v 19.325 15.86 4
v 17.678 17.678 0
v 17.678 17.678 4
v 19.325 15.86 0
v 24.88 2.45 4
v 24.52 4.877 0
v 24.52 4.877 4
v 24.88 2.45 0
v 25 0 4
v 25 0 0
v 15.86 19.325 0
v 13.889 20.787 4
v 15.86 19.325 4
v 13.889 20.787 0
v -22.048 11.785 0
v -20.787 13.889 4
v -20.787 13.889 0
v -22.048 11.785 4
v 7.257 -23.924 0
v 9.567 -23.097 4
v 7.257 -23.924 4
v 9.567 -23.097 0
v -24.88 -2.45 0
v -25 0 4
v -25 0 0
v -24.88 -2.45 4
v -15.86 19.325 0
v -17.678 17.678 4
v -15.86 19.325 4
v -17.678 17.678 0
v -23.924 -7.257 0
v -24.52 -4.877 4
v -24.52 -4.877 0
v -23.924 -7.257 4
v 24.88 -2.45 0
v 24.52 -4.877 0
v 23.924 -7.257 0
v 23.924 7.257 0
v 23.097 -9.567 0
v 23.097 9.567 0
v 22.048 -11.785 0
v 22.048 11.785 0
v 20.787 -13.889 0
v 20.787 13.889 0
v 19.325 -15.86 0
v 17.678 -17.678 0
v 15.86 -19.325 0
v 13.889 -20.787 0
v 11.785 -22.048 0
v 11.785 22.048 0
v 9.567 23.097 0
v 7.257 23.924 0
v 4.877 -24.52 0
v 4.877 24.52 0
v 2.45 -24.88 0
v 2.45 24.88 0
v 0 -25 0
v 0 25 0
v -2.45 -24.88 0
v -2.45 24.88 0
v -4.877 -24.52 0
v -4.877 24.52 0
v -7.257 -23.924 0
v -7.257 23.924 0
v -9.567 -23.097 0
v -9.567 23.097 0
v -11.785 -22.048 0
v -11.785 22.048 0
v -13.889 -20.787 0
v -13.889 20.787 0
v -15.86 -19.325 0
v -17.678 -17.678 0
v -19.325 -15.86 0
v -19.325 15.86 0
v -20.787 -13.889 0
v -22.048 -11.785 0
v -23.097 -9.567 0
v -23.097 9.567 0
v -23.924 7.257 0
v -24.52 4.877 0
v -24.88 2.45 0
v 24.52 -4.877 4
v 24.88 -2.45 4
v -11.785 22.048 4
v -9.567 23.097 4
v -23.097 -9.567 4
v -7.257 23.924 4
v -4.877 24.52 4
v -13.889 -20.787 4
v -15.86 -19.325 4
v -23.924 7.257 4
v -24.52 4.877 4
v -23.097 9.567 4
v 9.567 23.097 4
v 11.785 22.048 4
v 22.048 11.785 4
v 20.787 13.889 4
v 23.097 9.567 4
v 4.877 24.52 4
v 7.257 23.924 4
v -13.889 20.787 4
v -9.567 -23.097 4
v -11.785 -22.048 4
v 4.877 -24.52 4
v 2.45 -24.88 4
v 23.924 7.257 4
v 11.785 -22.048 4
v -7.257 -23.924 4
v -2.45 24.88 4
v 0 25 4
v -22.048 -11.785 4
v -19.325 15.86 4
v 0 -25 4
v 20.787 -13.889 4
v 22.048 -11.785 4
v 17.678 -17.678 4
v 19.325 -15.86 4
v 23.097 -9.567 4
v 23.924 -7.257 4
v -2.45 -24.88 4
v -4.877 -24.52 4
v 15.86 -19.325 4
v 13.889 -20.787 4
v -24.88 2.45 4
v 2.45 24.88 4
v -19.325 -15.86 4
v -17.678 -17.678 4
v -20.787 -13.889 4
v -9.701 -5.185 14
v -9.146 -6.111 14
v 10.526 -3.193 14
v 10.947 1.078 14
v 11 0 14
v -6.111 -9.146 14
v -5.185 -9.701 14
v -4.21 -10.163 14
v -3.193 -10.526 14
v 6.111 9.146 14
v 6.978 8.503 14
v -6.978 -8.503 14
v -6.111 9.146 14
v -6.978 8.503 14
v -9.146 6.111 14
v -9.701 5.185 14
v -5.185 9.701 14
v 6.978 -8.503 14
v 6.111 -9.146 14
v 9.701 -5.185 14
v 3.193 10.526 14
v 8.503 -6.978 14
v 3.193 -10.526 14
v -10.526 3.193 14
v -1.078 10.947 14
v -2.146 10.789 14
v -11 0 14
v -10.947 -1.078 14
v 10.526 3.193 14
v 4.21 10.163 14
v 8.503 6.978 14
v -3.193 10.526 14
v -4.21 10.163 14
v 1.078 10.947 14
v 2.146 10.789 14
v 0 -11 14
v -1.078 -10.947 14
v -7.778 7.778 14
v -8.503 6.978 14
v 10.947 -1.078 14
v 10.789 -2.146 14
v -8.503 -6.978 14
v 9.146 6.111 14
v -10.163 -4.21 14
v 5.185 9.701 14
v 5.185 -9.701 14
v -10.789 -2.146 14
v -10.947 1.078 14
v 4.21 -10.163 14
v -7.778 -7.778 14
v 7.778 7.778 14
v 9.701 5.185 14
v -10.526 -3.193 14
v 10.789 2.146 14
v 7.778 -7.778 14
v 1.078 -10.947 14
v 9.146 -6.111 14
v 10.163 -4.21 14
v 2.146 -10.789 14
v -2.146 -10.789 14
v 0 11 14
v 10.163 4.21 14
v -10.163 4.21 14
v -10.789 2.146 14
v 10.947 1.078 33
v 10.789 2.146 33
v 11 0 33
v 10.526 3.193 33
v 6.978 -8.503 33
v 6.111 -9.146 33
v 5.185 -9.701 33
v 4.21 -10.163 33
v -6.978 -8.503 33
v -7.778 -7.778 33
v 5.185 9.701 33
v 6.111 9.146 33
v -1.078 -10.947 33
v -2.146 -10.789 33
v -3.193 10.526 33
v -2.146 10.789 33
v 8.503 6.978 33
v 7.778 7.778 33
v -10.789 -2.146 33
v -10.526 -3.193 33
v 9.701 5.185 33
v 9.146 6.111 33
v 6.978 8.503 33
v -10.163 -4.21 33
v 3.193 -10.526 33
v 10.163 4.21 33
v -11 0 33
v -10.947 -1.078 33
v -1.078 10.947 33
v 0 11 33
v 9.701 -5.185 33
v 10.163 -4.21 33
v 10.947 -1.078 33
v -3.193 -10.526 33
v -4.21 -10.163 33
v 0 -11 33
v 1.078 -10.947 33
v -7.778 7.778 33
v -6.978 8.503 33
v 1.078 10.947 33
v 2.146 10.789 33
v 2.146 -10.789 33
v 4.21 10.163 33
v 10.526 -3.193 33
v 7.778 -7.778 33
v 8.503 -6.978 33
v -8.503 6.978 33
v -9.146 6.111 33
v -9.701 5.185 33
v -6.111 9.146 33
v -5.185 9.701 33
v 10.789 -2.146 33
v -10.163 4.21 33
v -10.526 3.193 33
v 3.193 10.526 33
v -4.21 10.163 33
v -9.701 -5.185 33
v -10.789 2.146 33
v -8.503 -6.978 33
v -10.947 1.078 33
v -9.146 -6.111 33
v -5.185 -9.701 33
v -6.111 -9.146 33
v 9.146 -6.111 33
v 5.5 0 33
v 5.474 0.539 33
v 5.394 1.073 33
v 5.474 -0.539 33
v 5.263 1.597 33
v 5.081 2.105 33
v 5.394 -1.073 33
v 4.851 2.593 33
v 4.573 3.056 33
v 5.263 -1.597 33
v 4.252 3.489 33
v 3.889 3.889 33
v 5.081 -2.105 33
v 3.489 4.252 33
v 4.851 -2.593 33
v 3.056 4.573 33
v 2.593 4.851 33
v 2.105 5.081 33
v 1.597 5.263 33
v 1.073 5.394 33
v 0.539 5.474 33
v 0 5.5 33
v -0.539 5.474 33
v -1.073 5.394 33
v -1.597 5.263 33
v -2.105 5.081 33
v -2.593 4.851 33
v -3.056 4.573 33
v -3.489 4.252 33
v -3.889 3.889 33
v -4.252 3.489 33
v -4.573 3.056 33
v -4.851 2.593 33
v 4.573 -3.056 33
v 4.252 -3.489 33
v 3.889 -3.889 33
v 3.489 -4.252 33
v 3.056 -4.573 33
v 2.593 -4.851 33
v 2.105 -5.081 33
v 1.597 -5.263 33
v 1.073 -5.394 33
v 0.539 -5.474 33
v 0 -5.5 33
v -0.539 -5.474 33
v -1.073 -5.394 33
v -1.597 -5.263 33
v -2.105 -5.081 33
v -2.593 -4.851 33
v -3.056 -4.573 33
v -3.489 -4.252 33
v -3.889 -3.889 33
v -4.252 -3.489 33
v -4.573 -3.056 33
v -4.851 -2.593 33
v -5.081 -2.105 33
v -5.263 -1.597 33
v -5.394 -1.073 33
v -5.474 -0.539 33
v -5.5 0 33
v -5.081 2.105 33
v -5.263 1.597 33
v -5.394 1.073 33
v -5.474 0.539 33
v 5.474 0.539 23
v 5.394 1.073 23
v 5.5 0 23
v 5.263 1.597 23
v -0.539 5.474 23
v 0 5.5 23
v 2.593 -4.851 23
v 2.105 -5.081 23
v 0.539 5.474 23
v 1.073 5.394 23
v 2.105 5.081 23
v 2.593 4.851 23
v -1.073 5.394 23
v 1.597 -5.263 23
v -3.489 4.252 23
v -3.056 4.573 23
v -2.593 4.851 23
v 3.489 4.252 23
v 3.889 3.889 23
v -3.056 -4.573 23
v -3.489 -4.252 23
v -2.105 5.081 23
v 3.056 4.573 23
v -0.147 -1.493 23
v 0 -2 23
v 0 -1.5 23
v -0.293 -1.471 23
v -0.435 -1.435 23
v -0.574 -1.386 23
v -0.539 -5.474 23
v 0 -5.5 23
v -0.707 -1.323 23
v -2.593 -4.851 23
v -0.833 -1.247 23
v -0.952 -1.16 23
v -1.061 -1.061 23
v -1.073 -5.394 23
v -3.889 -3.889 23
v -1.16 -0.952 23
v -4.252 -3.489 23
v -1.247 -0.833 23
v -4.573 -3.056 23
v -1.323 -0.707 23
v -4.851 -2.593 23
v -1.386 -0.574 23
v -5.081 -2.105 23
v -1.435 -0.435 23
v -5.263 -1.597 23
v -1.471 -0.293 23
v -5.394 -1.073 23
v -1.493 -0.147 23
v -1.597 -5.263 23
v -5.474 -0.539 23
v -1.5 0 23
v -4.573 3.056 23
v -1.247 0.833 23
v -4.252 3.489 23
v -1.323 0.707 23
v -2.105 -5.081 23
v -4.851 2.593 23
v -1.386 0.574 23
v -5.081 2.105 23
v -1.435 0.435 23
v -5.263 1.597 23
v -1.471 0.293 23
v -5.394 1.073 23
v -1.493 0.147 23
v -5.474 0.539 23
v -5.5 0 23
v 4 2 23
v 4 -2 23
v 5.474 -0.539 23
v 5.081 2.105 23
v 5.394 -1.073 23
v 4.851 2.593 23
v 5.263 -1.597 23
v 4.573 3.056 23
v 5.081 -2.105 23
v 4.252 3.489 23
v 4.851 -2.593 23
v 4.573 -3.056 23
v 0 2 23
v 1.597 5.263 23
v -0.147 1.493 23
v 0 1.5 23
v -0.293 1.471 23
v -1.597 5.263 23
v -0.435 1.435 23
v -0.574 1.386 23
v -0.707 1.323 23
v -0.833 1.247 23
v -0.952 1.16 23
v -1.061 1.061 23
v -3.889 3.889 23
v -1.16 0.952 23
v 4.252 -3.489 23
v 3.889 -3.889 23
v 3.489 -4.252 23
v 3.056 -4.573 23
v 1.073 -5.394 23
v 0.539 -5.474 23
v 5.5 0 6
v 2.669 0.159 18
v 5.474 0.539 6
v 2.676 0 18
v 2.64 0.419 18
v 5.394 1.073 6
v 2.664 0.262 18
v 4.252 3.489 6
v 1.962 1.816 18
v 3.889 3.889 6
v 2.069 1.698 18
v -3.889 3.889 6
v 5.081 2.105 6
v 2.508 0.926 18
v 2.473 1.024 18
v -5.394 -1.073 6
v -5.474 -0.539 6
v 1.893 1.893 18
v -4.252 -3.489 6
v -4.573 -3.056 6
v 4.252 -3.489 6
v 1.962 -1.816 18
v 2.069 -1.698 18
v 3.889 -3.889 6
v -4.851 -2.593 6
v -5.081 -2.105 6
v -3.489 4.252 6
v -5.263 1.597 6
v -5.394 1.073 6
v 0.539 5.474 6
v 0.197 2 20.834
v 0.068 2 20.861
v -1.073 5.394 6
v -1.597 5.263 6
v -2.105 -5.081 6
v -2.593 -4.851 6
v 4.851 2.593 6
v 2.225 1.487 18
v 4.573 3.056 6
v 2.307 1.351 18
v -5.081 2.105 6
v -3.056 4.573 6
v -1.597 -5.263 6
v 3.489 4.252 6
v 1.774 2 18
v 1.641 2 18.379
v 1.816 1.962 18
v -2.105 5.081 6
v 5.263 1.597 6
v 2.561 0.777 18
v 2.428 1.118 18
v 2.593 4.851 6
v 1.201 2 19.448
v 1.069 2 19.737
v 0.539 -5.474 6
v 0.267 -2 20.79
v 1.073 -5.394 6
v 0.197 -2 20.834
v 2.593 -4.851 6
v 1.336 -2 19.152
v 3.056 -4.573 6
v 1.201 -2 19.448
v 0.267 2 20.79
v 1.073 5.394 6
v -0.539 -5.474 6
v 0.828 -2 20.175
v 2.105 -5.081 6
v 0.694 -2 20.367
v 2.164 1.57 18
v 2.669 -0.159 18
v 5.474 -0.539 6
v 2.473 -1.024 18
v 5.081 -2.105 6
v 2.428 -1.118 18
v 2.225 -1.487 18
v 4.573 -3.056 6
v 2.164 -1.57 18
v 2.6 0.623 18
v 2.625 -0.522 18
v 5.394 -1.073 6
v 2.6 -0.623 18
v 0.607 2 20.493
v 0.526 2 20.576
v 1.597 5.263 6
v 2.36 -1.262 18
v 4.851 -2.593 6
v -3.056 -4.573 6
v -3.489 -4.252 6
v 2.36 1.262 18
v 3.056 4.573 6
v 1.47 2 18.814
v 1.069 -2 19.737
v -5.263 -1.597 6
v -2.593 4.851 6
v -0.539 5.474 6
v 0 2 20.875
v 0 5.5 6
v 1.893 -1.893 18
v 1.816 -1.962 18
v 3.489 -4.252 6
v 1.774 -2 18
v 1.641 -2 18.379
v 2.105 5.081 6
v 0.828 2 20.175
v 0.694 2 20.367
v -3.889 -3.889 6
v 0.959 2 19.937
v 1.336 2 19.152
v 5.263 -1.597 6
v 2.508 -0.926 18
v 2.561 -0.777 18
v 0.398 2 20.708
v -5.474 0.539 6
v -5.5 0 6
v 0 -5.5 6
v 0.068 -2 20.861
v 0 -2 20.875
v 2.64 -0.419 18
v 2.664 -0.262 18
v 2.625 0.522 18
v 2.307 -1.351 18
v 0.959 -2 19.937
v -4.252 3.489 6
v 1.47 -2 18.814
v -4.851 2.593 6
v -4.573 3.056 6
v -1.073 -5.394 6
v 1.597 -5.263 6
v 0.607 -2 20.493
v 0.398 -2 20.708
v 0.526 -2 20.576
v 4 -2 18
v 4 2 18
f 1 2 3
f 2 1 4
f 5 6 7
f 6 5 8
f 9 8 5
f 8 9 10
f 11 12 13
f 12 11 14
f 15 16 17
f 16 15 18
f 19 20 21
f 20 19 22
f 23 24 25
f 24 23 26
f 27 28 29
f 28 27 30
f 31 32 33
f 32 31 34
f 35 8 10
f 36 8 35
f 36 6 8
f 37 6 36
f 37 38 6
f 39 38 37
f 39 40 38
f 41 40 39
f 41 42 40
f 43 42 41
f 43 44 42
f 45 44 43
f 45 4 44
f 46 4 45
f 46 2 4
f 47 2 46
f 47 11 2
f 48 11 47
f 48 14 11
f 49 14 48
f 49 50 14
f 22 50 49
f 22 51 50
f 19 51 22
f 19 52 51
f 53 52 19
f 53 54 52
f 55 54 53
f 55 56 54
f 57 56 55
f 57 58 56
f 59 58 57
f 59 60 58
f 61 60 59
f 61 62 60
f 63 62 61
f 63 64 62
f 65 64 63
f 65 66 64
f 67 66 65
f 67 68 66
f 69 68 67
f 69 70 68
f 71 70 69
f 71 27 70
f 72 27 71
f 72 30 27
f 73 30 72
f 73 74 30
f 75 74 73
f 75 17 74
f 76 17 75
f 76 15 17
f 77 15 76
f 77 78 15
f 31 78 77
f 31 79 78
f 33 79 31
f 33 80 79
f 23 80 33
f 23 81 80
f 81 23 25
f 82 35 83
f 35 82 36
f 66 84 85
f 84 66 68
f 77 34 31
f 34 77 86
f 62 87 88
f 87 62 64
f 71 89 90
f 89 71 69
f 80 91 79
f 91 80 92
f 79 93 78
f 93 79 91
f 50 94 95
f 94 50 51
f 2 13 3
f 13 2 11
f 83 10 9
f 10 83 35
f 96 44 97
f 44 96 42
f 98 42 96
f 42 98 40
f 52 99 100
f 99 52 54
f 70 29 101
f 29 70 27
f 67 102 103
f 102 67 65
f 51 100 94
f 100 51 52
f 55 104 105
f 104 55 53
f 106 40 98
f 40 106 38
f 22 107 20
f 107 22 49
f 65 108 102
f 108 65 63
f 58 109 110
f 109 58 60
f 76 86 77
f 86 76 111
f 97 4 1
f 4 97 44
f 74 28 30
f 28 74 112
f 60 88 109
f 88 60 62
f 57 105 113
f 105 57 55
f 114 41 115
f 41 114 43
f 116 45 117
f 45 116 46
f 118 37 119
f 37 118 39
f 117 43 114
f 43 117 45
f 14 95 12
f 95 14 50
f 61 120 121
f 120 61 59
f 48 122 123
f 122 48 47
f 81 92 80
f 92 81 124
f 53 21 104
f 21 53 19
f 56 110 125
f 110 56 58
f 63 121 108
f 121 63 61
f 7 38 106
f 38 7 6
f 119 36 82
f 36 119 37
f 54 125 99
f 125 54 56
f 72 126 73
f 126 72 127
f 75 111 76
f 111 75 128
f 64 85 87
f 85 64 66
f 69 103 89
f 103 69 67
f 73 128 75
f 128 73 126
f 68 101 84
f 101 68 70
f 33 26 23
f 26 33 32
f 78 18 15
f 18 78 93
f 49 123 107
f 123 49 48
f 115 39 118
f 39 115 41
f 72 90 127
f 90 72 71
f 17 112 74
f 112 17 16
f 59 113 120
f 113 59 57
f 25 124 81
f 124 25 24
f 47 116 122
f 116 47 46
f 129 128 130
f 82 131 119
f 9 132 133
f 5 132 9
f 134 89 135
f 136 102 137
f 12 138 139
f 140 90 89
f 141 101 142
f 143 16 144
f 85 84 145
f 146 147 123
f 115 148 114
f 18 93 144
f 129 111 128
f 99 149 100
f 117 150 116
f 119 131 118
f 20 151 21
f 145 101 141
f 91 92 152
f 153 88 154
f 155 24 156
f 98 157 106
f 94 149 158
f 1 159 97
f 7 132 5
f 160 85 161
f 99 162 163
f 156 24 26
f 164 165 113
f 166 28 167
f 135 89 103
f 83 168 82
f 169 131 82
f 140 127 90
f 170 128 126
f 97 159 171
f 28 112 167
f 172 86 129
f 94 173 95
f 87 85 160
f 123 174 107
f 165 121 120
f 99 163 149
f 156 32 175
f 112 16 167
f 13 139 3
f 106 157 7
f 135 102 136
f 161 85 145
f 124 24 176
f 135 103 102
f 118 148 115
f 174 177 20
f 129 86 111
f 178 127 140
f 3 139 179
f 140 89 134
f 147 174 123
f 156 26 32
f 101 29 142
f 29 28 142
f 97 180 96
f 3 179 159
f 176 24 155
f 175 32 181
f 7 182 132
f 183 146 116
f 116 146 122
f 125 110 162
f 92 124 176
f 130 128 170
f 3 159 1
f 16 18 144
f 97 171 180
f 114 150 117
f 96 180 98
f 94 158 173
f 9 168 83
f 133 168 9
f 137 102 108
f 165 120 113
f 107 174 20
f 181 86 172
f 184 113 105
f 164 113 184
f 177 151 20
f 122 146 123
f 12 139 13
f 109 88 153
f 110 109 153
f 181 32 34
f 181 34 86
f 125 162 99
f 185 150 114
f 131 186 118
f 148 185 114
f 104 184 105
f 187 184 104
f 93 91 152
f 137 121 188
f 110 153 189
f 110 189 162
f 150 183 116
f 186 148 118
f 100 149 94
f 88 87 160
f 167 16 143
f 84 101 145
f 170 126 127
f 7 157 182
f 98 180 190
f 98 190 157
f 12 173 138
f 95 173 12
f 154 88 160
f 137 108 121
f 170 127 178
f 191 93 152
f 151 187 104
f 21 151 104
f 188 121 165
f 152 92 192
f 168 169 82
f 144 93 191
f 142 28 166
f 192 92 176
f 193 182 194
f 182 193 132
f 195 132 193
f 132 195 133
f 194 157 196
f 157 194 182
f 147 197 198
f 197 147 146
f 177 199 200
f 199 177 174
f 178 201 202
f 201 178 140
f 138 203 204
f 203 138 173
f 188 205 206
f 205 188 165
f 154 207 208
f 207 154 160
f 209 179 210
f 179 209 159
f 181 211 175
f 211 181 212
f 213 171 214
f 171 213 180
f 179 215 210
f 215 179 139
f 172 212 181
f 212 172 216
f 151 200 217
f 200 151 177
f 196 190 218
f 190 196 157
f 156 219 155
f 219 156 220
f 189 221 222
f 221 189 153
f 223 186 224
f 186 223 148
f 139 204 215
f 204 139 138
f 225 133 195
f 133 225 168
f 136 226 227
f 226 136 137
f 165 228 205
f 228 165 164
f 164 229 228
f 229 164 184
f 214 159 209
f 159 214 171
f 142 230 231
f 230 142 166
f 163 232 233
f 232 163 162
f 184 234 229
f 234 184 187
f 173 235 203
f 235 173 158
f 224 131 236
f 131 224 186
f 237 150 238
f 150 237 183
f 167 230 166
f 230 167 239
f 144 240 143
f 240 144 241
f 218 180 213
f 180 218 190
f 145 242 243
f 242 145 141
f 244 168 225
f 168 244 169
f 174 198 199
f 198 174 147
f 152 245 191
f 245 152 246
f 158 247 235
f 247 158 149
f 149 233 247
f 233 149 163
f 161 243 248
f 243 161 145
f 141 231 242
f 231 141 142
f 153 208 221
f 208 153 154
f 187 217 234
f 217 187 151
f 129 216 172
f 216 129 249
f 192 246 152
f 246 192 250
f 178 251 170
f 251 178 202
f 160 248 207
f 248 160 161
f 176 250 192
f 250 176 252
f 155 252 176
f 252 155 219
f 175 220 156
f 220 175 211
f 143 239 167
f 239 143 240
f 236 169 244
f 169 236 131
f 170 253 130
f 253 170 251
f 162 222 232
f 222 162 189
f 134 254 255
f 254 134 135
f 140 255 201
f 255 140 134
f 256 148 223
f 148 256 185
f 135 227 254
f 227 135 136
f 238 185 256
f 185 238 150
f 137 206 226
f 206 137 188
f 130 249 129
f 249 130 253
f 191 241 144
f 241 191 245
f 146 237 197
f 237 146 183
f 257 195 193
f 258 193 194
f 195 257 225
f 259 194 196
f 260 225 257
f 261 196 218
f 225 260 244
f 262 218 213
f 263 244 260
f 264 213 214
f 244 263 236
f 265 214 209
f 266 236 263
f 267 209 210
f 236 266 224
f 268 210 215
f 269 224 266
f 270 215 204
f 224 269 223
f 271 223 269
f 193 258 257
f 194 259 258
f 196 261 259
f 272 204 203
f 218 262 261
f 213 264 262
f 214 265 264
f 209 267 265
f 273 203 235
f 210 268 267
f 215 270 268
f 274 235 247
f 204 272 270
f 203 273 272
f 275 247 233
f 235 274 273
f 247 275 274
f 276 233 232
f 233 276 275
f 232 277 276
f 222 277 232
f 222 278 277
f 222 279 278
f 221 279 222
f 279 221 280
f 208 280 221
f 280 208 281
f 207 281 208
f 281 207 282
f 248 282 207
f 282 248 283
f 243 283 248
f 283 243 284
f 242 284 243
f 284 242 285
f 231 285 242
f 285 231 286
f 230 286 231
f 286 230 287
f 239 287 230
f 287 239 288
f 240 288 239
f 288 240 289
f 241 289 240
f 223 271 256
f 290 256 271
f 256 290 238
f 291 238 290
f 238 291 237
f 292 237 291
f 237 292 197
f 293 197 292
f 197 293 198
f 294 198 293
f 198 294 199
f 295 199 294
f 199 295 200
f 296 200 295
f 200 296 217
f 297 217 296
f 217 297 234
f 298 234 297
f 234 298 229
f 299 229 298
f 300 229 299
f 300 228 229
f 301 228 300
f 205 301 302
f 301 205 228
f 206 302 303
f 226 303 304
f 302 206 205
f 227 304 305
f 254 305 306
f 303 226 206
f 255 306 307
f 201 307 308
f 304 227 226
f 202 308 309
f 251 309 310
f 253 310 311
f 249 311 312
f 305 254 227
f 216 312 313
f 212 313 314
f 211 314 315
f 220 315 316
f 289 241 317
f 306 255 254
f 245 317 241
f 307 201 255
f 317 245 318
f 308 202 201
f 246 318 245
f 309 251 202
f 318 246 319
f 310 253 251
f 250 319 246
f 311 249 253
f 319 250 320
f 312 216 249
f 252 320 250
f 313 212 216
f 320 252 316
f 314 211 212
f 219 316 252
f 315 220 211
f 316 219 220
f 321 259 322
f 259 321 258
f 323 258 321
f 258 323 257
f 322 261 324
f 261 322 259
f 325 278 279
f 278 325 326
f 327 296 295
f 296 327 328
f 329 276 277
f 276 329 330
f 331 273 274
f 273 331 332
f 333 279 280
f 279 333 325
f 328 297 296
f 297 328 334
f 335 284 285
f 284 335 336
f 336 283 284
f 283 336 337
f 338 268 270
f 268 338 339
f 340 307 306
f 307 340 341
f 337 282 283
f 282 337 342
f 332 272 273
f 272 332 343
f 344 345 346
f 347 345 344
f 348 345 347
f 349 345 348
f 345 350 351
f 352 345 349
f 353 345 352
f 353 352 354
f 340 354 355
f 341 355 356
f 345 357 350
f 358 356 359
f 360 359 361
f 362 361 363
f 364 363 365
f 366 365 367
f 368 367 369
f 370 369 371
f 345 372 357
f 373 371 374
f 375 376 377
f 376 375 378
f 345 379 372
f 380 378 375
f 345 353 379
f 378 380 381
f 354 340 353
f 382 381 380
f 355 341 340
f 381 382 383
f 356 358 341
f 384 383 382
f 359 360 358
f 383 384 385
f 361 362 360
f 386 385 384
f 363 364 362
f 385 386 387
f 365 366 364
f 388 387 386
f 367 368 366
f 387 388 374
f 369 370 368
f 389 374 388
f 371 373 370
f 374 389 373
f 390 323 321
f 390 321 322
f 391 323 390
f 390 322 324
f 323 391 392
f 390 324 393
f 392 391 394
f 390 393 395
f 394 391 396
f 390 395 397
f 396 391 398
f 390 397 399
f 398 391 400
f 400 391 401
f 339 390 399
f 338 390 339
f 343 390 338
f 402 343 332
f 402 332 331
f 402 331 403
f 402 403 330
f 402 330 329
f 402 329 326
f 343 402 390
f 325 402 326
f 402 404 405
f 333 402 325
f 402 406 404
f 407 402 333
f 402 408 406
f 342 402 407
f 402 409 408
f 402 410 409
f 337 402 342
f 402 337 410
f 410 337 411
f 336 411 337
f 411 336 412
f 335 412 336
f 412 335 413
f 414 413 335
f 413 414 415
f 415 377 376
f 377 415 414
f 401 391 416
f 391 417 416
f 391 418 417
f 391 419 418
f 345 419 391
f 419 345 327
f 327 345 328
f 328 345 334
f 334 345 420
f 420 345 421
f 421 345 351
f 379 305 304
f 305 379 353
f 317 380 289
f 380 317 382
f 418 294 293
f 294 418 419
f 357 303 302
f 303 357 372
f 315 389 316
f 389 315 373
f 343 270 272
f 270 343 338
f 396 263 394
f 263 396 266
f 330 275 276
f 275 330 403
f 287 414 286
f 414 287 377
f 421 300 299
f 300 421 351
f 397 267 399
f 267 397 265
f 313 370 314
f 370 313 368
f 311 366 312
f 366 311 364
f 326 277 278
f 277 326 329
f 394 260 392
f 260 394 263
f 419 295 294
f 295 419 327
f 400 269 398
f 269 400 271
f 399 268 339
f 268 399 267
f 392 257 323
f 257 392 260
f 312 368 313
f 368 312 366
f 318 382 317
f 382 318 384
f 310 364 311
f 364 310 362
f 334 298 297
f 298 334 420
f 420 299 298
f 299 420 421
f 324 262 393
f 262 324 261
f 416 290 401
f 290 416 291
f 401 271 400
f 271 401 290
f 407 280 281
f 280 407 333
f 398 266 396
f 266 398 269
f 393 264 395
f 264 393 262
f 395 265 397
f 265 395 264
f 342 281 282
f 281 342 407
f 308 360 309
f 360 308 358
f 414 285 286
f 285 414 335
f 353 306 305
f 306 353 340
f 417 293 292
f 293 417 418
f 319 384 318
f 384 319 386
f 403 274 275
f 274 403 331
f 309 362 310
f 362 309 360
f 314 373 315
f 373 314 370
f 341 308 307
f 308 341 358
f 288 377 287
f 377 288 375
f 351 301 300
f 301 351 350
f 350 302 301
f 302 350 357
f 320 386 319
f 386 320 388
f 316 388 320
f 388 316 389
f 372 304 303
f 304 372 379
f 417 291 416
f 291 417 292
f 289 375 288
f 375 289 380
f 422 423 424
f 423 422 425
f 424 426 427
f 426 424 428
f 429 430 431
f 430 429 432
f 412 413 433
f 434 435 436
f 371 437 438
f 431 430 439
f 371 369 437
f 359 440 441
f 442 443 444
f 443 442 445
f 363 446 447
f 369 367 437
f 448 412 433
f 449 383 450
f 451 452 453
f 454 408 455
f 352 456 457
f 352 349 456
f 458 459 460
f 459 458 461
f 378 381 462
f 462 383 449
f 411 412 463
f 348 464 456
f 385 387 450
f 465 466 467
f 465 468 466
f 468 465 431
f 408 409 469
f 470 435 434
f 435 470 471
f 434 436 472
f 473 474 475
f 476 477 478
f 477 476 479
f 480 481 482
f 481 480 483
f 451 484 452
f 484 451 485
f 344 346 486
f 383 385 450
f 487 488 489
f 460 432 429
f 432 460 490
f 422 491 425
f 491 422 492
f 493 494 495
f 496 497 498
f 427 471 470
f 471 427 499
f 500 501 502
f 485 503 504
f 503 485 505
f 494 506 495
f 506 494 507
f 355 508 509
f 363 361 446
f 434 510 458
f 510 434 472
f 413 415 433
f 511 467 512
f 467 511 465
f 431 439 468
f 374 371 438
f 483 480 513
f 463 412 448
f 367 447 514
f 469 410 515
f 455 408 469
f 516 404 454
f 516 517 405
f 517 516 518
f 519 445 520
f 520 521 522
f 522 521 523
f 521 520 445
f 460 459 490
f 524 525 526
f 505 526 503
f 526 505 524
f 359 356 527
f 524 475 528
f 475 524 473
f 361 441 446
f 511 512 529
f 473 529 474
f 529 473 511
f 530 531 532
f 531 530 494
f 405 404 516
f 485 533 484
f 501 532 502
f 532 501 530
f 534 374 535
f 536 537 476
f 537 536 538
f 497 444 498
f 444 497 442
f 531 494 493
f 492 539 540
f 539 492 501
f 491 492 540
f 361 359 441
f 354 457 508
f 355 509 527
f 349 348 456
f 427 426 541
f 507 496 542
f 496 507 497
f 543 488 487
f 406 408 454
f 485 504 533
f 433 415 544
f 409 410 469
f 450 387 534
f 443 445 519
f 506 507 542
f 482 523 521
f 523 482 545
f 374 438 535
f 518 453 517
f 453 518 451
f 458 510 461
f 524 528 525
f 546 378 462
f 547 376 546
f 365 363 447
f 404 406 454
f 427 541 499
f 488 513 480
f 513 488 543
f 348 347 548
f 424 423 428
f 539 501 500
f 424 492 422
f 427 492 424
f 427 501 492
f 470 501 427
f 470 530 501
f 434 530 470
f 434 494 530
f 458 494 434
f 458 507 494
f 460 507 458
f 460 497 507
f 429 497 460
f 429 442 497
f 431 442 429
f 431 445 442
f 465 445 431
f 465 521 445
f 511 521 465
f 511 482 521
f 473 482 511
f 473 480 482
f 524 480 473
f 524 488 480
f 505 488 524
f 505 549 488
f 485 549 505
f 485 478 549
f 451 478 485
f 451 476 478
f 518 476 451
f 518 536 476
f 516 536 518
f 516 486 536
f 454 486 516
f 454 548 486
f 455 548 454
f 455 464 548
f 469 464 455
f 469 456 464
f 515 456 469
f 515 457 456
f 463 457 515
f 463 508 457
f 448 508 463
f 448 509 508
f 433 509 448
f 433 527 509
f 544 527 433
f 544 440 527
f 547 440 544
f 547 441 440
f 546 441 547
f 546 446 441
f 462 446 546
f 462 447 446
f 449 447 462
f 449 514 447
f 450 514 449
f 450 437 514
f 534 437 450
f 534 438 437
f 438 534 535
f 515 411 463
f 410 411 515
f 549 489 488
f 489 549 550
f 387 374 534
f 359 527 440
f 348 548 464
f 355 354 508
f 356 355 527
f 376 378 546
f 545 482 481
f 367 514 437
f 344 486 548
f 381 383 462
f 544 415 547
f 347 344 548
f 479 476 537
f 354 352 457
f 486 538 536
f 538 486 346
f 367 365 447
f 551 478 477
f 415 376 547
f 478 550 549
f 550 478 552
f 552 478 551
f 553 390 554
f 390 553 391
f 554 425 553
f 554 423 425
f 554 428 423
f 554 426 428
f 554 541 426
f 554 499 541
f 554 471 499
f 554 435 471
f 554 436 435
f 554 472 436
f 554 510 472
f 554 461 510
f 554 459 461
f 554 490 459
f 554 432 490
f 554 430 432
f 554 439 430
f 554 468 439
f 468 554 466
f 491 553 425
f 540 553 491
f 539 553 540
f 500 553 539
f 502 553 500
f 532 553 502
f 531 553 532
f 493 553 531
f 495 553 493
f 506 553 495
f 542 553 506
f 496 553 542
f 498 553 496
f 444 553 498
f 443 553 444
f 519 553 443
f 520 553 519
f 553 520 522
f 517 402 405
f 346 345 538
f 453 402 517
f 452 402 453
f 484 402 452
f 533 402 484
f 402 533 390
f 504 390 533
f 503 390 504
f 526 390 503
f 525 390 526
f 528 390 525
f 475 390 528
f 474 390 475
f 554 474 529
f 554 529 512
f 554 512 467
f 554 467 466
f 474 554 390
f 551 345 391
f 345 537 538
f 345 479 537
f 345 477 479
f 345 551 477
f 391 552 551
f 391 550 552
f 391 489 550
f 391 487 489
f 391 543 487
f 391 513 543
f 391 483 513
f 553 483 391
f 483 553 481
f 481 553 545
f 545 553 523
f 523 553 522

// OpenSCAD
// 1.5 mL microcentrifuge tube stand for an analytical balance
// Printed standing up: rests on XY plane at z = 0, builds upward (+Z), centred on origin.

$fn = 64;

// ---- Base disc (z = 0 to 4) ----
base_d   = 50;   // base disc diameter
base_h   = 4;    // base disc height

// ---- Cone (z = 4 to 14) ----
cone_top_d = 22; // cone top diameter
cone_bot_d = 50; // cone bottom diameter
cone_h     = 10; // cone height (14 - 4)

// ---- Column (z = 14 to 33) ----
col_d  = 22;     // column diameter
col_h  = 19;     // column height (33 - 14)

// ---- Tube seat (cut from top down the axis) ----
seat_d      = 11; // seat bore diameter (z = 33 down to 23)
seat_cyl_h  = 10; // straight seat height (33 - 23)
seat_cone_d = 3;  // seat cone tip diameter at z = 6
seat_cone_h = 17; // seat cone height (23 - 6)

// ---- Viewing window (cut through +X wall) ----
win_w  = 4;  // window width in Y
win_x  = 4;  // window width in X (wall thickness)
win_z0 = 18; // window bottom z
win_z1 = 30; // window top z

// ---- Build the solid stand ----
module stand() { union() {
    // Base disc
    translate([0, 0, 0])
        cylinder(h = base_h, d = base_d, $fn = $fn);

    // Cone from 50 mm at z = 4 to 22 mm at z = 14
    translate([0, 0, base_h])
        cylinder(h = cone_h, d1 = cone_bot_d, d2 = cone_top_d, $fn = $fn);

    // Column from z = 14 to 33
    translate([0, 0, base_h + cone_h])
        cylinder(h = col_h, d = col_d, $fn = $fn);
} }

// ---- Tube seat cutter (extends 1 mm above the top so the cut is clean) ----
module seat_cutter() { union() {
    // Straight bore: z = 33 down to 23
    translate([0, 0, 23])
        cylinder(h = seat_cyl_h, d = seat_d, $fn = $fn);

    // Cone following the tube tip: 11 mm at z = 23 down to 3 mm at z = 6
    translate([0, 0, 6])
        cylinder(h = seat_cone_h, d1 = seat_d, d2 = seat_cone_d, $fn = $fn);

    // 1 mm extension above the top face so the bore is fully open
    translate([0, 0, 33])
        cylinder(h = 1, d = seat_d, $fn = $fn);
} }

// ---- Viewing window cutter (4 mm x 4 mm slot through the +X wall) ----
// Starts at x = 0 (inside the bore) and extends to x = 12 (past the outer wall at x = 11),
// so it cuts a clean 4 mm wide slot through the +X wall only.
module window_cutter() { translate([0, -win_w / 2, win_z0])
    cube([win_x, win_w, win_z1 - win_z0]); }

// ---- Final part: stand minus seat and window ----
difference() {
    stand();
    seat_cutter();
    window_cutter();
}
